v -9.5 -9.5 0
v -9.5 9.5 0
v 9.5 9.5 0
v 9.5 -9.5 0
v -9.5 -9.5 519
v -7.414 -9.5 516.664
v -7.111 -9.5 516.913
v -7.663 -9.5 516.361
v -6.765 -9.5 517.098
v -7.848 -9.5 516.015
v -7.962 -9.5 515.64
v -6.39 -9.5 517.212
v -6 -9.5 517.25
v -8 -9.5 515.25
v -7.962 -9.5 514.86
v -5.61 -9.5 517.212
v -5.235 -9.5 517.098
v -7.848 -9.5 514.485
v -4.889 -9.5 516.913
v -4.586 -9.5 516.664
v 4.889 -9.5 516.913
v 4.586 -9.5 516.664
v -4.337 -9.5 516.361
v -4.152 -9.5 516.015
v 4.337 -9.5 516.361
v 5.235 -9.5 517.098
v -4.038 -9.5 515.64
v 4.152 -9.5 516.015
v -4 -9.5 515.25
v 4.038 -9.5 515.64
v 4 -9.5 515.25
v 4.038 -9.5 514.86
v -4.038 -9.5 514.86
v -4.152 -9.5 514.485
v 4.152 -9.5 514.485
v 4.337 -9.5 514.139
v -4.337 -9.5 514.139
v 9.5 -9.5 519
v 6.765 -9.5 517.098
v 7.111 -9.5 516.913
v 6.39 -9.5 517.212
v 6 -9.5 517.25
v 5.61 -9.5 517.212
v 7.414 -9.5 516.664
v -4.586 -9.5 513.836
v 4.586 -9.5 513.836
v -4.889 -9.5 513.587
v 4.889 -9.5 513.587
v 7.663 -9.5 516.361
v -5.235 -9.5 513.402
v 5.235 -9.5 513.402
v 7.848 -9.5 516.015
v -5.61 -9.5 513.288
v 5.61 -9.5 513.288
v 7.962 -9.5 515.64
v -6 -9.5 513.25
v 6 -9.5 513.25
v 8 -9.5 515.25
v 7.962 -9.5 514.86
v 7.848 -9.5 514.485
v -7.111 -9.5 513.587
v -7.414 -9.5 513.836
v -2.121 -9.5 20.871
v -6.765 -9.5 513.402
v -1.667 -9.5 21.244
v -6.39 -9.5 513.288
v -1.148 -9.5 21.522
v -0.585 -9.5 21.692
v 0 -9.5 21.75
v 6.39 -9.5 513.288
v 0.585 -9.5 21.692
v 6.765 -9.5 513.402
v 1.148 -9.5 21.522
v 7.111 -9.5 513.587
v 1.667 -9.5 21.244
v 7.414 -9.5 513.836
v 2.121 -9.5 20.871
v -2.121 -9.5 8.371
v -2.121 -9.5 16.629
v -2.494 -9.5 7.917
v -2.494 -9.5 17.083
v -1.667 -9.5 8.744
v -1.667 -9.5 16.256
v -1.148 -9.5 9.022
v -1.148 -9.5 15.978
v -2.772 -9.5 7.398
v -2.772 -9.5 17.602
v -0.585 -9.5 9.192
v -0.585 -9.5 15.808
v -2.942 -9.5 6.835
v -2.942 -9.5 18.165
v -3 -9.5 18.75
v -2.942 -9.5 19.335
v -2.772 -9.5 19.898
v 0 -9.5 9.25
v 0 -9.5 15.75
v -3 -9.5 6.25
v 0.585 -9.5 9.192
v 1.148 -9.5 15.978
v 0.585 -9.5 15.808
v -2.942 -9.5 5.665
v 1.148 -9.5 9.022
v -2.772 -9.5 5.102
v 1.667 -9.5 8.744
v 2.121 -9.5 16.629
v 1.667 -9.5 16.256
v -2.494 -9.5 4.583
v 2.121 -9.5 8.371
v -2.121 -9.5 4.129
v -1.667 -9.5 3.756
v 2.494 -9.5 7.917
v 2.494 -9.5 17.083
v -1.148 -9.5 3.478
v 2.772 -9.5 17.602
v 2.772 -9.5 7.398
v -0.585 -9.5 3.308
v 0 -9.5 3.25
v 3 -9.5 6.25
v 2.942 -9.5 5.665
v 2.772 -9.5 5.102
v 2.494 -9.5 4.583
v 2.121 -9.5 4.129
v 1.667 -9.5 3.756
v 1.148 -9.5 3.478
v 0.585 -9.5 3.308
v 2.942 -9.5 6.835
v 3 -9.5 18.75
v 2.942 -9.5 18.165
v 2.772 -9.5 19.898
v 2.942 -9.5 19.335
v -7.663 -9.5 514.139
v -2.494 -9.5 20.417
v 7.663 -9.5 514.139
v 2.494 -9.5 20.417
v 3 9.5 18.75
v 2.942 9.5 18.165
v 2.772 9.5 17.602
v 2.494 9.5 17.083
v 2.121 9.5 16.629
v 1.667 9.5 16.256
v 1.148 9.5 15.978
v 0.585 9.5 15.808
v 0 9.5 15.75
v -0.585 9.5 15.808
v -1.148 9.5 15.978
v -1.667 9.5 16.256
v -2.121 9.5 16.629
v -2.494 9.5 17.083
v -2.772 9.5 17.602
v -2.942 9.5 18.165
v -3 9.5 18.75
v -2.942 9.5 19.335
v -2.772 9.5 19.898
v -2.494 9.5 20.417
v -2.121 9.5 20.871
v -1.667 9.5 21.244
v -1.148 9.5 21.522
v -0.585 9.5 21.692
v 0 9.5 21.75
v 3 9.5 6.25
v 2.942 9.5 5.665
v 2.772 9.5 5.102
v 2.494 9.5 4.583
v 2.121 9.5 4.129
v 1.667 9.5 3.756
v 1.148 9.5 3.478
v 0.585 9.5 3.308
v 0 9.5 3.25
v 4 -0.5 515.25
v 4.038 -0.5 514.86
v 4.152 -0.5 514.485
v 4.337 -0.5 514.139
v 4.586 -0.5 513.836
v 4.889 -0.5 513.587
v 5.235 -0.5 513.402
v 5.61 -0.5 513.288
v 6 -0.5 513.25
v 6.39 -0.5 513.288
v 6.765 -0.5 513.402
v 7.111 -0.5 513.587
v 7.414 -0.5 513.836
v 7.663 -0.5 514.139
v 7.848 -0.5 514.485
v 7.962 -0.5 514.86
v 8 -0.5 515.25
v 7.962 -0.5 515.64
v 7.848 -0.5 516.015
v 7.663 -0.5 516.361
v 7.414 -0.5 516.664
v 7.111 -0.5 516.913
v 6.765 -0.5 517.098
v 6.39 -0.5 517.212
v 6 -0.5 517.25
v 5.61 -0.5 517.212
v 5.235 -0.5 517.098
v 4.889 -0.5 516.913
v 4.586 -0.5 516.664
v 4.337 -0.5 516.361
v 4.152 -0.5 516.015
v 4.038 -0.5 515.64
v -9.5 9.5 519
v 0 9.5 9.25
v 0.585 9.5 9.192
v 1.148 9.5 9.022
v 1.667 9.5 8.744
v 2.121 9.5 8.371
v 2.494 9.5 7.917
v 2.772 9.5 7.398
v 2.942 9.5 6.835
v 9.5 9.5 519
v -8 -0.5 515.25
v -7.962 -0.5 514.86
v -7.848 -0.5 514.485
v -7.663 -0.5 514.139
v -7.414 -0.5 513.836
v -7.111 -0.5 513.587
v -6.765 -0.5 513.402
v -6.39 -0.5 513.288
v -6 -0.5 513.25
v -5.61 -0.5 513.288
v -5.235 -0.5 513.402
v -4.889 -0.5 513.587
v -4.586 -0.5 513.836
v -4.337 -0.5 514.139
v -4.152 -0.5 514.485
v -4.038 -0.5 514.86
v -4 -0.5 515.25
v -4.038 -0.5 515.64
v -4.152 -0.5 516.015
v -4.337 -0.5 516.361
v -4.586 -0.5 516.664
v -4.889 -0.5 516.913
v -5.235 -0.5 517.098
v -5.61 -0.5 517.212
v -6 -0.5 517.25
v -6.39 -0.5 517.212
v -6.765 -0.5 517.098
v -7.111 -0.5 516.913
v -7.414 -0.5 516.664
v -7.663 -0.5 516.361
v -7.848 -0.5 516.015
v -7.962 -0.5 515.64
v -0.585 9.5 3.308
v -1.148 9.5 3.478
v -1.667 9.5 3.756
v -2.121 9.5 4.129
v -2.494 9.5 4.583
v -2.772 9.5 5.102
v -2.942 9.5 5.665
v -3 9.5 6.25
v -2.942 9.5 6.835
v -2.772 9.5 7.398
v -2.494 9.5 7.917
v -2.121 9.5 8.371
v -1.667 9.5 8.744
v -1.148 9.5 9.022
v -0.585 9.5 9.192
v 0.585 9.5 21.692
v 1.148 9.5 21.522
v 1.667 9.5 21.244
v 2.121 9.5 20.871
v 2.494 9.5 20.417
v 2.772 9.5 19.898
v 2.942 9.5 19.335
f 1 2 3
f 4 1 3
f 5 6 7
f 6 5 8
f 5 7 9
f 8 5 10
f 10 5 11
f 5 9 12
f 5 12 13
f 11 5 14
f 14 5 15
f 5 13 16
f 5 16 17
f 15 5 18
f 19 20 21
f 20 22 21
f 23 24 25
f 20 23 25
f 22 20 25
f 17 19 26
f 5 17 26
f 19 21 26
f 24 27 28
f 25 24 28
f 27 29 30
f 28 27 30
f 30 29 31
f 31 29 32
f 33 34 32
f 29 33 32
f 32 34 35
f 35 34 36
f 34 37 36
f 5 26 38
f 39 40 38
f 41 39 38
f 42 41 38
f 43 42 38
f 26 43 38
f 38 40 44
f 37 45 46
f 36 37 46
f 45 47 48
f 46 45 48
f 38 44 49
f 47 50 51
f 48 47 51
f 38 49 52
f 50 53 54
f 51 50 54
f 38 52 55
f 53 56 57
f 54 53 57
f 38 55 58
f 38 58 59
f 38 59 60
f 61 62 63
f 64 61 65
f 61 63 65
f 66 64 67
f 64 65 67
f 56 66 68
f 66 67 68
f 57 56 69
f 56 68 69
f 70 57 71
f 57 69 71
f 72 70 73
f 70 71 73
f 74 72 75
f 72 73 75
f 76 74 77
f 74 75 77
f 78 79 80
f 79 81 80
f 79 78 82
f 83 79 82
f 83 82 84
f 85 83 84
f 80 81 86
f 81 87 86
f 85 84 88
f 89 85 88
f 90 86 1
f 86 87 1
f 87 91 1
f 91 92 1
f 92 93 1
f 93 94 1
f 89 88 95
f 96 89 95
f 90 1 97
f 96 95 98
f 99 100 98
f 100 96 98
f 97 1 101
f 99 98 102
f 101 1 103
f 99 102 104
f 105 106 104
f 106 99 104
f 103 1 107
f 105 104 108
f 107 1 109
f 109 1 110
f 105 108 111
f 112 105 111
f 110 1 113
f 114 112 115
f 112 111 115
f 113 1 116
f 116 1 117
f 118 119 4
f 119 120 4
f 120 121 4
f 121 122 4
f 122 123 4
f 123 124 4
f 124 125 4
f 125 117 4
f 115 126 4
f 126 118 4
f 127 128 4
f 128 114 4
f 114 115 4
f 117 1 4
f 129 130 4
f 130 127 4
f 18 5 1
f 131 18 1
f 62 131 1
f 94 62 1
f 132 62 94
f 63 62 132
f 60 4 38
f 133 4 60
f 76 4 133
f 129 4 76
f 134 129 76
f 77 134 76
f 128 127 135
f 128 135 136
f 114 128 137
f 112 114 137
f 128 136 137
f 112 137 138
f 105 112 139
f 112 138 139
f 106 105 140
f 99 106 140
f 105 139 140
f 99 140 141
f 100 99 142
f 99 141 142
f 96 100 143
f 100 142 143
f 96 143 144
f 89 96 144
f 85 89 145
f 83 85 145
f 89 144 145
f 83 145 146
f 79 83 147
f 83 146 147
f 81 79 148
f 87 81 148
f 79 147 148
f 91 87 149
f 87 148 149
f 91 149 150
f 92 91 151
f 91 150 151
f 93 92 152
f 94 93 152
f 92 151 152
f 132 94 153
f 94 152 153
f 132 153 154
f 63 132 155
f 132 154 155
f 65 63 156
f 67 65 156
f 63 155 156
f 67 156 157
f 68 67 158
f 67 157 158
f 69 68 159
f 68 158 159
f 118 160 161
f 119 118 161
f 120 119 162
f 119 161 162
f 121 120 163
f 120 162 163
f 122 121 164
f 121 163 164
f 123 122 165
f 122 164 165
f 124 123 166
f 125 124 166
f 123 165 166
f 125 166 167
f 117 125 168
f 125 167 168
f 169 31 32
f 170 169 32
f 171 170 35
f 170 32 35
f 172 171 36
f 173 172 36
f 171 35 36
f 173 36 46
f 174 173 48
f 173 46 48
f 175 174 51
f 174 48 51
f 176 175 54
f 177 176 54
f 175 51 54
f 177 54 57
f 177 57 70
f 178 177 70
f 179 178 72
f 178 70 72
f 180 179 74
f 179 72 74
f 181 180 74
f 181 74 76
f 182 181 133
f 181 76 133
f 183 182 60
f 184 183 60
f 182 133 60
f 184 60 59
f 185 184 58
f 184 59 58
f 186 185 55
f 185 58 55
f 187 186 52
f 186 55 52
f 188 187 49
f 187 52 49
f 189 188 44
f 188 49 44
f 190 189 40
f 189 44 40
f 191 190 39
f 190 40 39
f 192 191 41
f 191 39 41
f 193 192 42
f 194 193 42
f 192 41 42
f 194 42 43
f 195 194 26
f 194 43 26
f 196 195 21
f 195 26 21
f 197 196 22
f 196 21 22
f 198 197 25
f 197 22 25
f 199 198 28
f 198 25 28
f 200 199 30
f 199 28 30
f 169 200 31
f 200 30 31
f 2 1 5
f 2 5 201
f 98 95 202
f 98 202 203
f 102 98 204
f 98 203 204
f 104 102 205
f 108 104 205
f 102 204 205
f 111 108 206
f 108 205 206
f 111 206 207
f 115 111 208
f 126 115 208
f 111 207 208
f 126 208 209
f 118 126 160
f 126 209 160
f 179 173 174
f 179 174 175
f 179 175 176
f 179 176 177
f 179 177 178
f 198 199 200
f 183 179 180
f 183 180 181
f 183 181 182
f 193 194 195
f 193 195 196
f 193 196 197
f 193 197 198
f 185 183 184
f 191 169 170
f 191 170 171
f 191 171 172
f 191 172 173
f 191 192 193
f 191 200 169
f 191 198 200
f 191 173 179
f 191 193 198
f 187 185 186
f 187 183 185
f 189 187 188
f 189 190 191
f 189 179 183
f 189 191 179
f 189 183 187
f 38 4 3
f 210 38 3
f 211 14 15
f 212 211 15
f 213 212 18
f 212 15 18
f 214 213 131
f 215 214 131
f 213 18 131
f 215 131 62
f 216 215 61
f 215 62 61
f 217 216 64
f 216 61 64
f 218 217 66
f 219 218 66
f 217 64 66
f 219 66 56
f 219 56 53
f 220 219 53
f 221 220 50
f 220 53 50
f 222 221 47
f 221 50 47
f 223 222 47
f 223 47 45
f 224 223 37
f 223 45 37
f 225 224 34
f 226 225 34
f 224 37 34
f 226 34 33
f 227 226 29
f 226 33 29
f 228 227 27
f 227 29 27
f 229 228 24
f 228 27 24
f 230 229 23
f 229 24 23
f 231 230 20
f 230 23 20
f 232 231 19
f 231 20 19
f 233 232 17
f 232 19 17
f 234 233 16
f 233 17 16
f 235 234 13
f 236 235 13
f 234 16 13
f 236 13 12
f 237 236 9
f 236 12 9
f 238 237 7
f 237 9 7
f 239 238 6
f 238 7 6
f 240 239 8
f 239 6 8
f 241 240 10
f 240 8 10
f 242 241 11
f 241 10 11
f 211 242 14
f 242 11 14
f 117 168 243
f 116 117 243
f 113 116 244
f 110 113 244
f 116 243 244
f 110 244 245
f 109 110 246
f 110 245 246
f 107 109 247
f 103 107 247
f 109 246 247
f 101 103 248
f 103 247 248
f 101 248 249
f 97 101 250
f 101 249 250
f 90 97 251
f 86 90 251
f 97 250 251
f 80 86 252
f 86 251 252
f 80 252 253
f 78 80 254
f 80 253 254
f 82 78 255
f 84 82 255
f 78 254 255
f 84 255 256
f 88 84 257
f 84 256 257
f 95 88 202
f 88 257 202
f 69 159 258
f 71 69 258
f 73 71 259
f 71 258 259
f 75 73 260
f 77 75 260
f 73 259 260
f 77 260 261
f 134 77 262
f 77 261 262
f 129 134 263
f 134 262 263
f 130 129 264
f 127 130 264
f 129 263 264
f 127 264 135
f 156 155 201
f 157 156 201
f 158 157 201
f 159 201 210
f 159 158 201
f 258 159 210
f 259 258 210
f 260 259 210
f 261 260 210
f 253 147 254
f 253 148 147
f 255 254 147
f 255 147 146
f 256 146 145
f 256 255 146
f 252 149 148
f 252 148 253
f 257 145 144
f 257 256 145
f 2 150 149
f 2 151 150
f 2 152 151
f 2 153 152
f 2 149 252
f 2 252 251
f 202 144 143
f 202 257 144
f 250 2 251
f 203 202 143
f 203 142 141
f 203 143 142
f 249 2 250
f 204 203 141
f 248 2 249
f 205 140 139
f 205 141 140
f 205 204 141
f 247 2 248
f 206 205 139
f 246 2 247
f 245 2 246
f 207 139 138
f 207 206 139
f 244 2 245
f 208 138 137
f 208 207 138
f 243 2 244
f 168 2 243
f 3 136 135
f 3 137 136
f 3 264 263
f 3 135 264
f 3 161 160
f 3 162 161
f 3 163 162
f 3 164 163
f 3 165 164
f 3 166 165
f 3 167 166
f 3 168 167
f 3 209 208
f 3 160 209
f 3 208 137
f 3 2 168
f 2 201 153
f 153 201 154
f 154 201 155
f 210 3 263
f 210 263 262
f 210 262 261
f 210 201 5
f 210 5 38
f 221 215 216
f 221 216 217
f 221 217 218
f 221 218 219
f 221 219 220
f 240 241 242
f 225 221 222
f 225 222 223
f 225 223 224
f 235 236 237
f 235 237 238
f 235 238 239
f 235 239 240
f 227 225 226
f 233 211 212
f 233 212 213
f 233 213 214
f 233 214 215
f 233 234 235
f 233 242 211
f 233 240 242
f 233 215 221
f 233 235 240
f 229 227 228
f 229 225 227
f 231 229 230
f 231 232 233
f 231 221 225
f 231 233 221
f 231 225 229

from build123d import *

# Parameters (mm, degrees)
SKETCH1_W               = 19
SKETCH1_H               = 19
BOSS_EXTRUDE1_DEPTH     = 519
CUT_EXTRUDE1_DEPTH      = 9
CUT_EXTRUDE2_DEPTH      = 1
CUT_EXTRUDE2_DEPTH_BACK = 20


with BuildPart() as part:
    # Sketch1 → Boss-Extrude1 (new body)
    with BuildSketch(Plane.XY):
        Rectangle(SKETCH1_W, SKETCH1_H)
    extrude(amount=BOSS_EXTRUDE1_DEPTH)

    # Sketch2 → Cut-Extrude1 (cut)
    with BuildSketch(Plane.XZ.offset(9.5)):
        with BuildLine():
            ThreePointArc((-4, 515.25), (-6, 517.25), (-8, 515.25))
            Line((-8, 515.25), (-4, 515.25))
        make_face()
        with BuildLine():
            Line((-4, 515.25), (-8, 515.25))
            ThreePointArc((-8, 515.25), (-6, 513.25), (-4, 515.25))
        make_face()
        with BuildLine():
            ThreePointArc((8, 515.25), (6, 517.25), (4, 515.25))
            Line((4, 515.25), (6, 515.25))
            Line((6, 515.25), (8, 515.25))
        make_face()
        with BuildLine():
            Line((6, 515.25), (4, 515.25))
            ThreePointArc((4, 515.25), (6, 513.25), (8, 515.25))
            Line((8, 515.25), (6, 515.25))
        make_face()
    extrude(amount=-CUT_EXTRUDE1_DEPTH, mode=Mode.SUBTRACT)

    # Sketch3 → Cut-Extrude2 (cut, two sides)
    with BuildSketch(Plane(origin=(0, 9.5, 0), x_dir=(1, 0, 0), z_dir=(0, 1, 0))) as cut_extrude2_sk:
        with BuildLine():
            ThreePointArc((3, -18.75), (2.121320344, -16.628679656), (0, -15.75))
            Line((0, -15.75), (0, -21.75))
            ThreePointArc((0, -21.75), (2.121320344, -20.871320344), (3, -18.75))
        make_face()
        with BuildLine():
            Line((0, -21.75), (0, -15.75))
            ThreePointArc((0, -15.75), (-3, -18.75), (0, -21.75))
        make_face()
        with BuildLine():
            ThreePointArc((3, -6.25), (2.121320344, -4.128679656), (0, -3.25))
            Line((0, -3.25), (0, -9.25))
            ThreePointArc((0, -9.25), (2.121320344, -8.371320344), (3, -6.25))
        make_face()
        with BuildLine():
            Line((0, -9.25), (0, -3.25))
            ThreePointArc((0, -3.25), (-3, -6.25), (0, -9.25))
        make_face()
    extrude(amount=CUT_EXTRUDE2_DEPTH, mode=Mode.SUBTRACT)
    extrude(cut_extrude2_sk.sketch, amount=-CUT_EXTRUDE2_DEPTH_BACK, mode=Mode.SUBTRACT)


solid = part.part
